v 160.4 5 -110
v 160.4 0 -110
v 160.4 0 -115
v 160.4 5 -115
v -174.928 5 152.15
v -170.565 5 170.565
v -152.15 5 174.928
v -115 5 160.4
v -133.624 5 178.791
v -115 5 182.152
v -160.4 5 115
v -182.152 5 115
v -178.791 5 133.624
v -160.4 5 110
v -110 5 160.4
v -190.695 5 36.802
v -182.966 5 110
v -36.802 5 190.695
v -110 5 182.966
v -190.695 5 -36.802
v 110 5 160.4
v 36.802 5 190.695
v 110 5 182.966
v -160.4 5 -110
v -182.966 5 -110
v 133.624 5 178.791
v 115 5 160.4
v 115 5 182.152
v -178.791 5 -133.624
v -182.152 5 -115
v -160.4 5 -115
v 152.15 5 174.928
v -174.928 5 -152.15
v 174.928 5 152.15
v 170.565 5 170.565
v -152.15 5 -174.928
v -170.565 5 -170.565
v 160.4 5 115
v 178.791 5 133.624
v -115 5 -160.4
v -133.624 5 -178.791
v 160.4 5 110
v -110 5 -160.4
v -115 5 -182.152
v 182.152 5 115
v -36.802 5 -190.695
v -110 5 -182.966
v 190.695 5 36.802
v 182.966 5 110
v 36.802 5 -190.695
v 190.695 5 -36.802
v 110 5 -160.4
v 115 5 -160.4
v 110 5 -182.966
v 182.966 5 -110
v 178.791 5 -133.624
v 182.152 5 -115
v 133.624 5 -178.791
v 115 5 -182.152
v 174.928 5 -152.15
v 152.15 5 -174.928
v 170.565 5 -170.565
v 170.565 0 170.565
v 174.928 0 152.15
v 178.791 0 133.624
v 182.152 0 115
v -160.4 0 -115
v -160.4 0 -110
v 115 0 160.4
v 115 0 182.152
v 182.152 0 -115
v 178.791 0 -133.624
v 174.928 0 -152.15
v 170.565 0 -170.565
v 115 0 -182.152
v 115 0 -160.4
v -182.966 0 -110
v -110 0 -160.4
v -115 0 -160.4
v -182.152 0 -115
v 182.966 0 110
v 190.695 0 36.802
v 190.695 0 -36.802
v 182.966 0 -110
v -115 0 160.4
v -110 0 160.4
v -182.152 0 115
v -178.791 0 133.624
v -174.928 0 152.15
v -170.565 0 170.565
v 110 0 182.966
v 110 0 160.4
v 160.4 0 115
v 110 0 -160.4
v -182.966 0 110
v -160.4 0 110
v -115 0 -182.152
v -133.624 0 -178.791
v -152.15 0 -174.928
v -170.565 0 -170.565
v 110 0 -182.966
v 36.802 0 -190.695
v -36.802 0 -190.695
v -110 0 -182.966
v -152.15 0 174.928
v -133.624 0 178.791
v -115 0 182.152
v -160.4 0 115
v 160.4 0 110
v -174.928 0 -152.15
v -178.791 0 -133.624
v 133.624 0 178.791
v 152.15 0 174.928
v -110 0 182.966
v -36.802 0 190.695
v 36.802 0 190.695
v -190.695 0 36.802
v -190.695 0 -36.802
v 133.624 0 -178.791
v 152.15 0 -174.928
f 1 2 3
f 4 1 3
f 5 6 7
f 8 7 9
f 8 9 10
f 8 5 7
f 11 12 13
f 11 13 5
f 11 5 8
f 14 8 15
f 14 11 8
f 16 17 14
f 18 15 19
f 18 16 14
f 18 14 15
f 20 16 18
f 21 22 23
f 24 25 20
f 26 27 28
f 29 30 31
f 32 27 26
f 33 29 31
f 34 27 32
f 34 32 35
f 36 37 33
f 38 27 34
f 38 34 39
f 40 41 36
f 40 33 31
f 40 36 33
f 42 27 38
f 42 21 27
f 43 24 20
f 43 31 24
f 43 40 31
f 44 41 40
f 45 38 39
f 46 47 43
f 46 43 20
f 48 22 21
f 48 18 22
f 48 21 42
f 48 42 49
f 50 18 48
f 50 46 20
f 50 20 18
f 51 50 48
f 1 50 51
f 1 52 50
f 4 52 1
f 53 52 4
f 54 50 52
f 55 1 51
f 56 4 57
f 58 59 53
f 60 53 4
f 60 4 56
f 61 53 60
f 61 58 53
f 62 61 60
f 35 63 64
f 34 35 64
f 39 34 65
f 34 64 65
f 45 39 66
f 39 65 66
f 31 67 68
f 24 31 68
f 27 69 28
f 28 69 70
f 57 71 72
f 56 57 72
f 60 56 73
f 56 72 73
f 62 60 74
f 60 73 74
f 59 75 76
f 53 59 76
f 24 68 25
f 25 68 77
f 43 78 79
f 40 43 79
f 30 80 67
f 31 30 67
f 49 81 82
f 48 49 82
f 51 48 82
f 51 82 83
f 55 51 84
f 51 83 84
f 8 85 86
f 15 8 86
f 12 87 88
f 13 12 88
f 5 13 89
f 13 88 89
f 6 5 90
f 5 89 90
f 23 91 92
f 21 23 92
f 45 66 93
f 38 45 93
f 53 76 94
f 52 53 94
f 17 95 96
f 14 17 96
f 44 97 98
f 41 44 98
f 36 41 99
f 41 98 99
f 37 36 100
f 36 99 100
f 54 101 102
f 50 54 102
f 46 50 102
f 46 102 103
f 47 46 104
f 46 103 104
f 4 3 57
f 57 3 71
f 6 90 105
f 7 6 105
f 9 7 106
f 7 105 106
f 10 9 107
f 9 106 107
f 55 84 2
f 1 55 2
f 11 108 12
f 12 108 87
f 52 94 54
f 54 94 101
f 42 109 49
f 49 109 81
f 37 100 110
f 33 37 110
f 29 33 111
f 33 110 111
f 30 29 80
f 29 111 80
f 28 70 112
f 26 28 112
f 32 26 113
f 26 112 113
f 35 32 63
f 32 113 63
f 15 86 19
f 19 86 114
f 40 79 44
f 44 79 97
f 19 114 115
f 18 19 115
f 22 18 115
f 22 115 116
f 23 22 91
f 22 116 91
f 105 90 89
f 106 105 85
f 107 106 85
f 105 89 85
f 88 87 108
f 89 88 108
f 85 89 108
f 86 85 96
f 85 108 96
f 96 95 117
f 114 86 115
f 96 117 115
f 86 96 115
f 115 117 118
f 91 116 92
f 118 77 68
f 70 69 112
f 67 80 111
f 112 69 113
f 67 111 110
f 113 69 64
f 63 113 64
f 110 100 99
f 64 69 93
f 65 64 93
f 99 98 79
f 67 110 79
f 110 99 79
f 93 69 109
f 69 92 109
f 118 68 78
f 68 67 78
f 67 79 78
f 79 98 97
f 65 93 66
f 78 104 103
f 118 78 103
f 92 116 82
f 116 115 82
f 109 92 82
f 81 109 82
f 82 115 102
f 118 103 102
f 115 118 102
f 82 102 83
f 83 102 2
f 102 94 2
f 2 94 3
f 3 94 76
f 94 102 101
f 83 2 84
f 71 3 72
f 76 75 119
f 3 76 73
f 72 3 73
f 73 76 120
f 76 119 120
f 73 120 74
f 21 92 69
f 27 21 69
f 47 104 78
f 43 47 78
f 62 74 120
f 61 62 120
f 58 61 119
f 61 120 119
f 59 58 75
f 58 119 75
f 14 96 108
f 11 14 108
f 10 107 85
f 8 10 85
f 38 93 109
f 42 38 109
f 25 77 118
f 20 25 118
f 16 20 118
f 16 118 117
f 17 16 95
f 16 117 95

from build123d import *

# Parameters (mm, degrees)
BOSS_EXTRUDE1_DEPTH = 5


with BuildPart() as part:
    # Sketch1 → Boss-Extrude1 (new body)
    with BuildSketch(Plane(origin=(0, 0, 0), x_dir=(1, 0, 0), z_dir=(0, 1, 0))):
        with BuildLine():
            Line((115, 160.4), (110, 160.4))
            Line((110, 160.4), (110, 182.966371269))
            ThreePointArc((110, 182.966371269), (0, 191.663253961), (-110, 182.966371269))
            Line((-110, 182.966371269), (-110, 160.4))
            Line((-110, 160.4), (-115, 160.4))
            Line((-115, 160.4), (-115, 182.15221115))
            ThreePointArc((-115, 182.15221115), (-142.899993603, 176.922031233), (-170.565, 170.565))
            ThreePointArc((-170.565, 170.565), (-176.922031233, 142.899993603), (-182.15221115, 115))
            Line((-182.15221115, 115), (-160.4, 115))
            Line((-160.4, 115), (-160.4, 110))
            Line((-160.4, 110), (-182.966371269, 110))
            ThreePointArc((-182.966371269, 110), (-191.663253961, 0), (-182.966371269, -110))
            Line((-182.966371269, -110), (-160.4, -110))
            Line((-160.4, -110), (-160.4, -115))
            Line((-160.4, -115), (-182.15221115, -115))
            ThreePointArc((-182.15221115, -115), (-176.922031233, -142.899993603), (-170.565, -170.565))
            ThreePointArc((-170.565, -170.565), (-142.899993603, -176.922031233), (-115, -182.15221115))
            Line((-115, -182.15221115), (-115, -160.4))
            Line((-115, -160.4), (-110, -160.4))
            Line((-110, -160.4), (-110, -182.966371269))
            ThreePointArc((-110, -182.966371269), (0, -191.663253961), (110, -182.966371269))
            Line((110, -182.966371269), (110, -160.4))
            Line((110, -160.4), (115, -160.4))
            Line((115, -160.4), (115, -182.15221115))
            ThreePointArc((115, -182.15221115), (142.899993603, -176.922031233), (170.565, -170.565))
            ThreePointArc((170.565, -170.565), (176.922031233, -142.899993603), (182.15221115, -115))
            Line((182.15221115, -115), (160.4, -115))
            Line((160.4, -115), (160.4, -110))
            Line((160.4, -110), (182.966371269, -110))
            ThreePointArc((182.966371269, -110), (191.663253961, 0), (182.966371269, 110))
            Line((182.966371269, 110), (160.4, 110))
            Line((160.4, 110), (160.4, 115))
            Line((160.4, 115), (182.15221115, 115))
            ThreePointArc((182.15221115, 115), (176.922031233, 142.899993603), (170.565, 170.565))
            ThreePointArc((170.565, 170.565), (142.899993603, 176.922031233), (115, 182.15221115))
            Line((115, 182.15221115), (115, 160.4))
        make_face()
    extrude(amount=BOSS_EXTRUDE1_DEPTH)


solid = part.part
